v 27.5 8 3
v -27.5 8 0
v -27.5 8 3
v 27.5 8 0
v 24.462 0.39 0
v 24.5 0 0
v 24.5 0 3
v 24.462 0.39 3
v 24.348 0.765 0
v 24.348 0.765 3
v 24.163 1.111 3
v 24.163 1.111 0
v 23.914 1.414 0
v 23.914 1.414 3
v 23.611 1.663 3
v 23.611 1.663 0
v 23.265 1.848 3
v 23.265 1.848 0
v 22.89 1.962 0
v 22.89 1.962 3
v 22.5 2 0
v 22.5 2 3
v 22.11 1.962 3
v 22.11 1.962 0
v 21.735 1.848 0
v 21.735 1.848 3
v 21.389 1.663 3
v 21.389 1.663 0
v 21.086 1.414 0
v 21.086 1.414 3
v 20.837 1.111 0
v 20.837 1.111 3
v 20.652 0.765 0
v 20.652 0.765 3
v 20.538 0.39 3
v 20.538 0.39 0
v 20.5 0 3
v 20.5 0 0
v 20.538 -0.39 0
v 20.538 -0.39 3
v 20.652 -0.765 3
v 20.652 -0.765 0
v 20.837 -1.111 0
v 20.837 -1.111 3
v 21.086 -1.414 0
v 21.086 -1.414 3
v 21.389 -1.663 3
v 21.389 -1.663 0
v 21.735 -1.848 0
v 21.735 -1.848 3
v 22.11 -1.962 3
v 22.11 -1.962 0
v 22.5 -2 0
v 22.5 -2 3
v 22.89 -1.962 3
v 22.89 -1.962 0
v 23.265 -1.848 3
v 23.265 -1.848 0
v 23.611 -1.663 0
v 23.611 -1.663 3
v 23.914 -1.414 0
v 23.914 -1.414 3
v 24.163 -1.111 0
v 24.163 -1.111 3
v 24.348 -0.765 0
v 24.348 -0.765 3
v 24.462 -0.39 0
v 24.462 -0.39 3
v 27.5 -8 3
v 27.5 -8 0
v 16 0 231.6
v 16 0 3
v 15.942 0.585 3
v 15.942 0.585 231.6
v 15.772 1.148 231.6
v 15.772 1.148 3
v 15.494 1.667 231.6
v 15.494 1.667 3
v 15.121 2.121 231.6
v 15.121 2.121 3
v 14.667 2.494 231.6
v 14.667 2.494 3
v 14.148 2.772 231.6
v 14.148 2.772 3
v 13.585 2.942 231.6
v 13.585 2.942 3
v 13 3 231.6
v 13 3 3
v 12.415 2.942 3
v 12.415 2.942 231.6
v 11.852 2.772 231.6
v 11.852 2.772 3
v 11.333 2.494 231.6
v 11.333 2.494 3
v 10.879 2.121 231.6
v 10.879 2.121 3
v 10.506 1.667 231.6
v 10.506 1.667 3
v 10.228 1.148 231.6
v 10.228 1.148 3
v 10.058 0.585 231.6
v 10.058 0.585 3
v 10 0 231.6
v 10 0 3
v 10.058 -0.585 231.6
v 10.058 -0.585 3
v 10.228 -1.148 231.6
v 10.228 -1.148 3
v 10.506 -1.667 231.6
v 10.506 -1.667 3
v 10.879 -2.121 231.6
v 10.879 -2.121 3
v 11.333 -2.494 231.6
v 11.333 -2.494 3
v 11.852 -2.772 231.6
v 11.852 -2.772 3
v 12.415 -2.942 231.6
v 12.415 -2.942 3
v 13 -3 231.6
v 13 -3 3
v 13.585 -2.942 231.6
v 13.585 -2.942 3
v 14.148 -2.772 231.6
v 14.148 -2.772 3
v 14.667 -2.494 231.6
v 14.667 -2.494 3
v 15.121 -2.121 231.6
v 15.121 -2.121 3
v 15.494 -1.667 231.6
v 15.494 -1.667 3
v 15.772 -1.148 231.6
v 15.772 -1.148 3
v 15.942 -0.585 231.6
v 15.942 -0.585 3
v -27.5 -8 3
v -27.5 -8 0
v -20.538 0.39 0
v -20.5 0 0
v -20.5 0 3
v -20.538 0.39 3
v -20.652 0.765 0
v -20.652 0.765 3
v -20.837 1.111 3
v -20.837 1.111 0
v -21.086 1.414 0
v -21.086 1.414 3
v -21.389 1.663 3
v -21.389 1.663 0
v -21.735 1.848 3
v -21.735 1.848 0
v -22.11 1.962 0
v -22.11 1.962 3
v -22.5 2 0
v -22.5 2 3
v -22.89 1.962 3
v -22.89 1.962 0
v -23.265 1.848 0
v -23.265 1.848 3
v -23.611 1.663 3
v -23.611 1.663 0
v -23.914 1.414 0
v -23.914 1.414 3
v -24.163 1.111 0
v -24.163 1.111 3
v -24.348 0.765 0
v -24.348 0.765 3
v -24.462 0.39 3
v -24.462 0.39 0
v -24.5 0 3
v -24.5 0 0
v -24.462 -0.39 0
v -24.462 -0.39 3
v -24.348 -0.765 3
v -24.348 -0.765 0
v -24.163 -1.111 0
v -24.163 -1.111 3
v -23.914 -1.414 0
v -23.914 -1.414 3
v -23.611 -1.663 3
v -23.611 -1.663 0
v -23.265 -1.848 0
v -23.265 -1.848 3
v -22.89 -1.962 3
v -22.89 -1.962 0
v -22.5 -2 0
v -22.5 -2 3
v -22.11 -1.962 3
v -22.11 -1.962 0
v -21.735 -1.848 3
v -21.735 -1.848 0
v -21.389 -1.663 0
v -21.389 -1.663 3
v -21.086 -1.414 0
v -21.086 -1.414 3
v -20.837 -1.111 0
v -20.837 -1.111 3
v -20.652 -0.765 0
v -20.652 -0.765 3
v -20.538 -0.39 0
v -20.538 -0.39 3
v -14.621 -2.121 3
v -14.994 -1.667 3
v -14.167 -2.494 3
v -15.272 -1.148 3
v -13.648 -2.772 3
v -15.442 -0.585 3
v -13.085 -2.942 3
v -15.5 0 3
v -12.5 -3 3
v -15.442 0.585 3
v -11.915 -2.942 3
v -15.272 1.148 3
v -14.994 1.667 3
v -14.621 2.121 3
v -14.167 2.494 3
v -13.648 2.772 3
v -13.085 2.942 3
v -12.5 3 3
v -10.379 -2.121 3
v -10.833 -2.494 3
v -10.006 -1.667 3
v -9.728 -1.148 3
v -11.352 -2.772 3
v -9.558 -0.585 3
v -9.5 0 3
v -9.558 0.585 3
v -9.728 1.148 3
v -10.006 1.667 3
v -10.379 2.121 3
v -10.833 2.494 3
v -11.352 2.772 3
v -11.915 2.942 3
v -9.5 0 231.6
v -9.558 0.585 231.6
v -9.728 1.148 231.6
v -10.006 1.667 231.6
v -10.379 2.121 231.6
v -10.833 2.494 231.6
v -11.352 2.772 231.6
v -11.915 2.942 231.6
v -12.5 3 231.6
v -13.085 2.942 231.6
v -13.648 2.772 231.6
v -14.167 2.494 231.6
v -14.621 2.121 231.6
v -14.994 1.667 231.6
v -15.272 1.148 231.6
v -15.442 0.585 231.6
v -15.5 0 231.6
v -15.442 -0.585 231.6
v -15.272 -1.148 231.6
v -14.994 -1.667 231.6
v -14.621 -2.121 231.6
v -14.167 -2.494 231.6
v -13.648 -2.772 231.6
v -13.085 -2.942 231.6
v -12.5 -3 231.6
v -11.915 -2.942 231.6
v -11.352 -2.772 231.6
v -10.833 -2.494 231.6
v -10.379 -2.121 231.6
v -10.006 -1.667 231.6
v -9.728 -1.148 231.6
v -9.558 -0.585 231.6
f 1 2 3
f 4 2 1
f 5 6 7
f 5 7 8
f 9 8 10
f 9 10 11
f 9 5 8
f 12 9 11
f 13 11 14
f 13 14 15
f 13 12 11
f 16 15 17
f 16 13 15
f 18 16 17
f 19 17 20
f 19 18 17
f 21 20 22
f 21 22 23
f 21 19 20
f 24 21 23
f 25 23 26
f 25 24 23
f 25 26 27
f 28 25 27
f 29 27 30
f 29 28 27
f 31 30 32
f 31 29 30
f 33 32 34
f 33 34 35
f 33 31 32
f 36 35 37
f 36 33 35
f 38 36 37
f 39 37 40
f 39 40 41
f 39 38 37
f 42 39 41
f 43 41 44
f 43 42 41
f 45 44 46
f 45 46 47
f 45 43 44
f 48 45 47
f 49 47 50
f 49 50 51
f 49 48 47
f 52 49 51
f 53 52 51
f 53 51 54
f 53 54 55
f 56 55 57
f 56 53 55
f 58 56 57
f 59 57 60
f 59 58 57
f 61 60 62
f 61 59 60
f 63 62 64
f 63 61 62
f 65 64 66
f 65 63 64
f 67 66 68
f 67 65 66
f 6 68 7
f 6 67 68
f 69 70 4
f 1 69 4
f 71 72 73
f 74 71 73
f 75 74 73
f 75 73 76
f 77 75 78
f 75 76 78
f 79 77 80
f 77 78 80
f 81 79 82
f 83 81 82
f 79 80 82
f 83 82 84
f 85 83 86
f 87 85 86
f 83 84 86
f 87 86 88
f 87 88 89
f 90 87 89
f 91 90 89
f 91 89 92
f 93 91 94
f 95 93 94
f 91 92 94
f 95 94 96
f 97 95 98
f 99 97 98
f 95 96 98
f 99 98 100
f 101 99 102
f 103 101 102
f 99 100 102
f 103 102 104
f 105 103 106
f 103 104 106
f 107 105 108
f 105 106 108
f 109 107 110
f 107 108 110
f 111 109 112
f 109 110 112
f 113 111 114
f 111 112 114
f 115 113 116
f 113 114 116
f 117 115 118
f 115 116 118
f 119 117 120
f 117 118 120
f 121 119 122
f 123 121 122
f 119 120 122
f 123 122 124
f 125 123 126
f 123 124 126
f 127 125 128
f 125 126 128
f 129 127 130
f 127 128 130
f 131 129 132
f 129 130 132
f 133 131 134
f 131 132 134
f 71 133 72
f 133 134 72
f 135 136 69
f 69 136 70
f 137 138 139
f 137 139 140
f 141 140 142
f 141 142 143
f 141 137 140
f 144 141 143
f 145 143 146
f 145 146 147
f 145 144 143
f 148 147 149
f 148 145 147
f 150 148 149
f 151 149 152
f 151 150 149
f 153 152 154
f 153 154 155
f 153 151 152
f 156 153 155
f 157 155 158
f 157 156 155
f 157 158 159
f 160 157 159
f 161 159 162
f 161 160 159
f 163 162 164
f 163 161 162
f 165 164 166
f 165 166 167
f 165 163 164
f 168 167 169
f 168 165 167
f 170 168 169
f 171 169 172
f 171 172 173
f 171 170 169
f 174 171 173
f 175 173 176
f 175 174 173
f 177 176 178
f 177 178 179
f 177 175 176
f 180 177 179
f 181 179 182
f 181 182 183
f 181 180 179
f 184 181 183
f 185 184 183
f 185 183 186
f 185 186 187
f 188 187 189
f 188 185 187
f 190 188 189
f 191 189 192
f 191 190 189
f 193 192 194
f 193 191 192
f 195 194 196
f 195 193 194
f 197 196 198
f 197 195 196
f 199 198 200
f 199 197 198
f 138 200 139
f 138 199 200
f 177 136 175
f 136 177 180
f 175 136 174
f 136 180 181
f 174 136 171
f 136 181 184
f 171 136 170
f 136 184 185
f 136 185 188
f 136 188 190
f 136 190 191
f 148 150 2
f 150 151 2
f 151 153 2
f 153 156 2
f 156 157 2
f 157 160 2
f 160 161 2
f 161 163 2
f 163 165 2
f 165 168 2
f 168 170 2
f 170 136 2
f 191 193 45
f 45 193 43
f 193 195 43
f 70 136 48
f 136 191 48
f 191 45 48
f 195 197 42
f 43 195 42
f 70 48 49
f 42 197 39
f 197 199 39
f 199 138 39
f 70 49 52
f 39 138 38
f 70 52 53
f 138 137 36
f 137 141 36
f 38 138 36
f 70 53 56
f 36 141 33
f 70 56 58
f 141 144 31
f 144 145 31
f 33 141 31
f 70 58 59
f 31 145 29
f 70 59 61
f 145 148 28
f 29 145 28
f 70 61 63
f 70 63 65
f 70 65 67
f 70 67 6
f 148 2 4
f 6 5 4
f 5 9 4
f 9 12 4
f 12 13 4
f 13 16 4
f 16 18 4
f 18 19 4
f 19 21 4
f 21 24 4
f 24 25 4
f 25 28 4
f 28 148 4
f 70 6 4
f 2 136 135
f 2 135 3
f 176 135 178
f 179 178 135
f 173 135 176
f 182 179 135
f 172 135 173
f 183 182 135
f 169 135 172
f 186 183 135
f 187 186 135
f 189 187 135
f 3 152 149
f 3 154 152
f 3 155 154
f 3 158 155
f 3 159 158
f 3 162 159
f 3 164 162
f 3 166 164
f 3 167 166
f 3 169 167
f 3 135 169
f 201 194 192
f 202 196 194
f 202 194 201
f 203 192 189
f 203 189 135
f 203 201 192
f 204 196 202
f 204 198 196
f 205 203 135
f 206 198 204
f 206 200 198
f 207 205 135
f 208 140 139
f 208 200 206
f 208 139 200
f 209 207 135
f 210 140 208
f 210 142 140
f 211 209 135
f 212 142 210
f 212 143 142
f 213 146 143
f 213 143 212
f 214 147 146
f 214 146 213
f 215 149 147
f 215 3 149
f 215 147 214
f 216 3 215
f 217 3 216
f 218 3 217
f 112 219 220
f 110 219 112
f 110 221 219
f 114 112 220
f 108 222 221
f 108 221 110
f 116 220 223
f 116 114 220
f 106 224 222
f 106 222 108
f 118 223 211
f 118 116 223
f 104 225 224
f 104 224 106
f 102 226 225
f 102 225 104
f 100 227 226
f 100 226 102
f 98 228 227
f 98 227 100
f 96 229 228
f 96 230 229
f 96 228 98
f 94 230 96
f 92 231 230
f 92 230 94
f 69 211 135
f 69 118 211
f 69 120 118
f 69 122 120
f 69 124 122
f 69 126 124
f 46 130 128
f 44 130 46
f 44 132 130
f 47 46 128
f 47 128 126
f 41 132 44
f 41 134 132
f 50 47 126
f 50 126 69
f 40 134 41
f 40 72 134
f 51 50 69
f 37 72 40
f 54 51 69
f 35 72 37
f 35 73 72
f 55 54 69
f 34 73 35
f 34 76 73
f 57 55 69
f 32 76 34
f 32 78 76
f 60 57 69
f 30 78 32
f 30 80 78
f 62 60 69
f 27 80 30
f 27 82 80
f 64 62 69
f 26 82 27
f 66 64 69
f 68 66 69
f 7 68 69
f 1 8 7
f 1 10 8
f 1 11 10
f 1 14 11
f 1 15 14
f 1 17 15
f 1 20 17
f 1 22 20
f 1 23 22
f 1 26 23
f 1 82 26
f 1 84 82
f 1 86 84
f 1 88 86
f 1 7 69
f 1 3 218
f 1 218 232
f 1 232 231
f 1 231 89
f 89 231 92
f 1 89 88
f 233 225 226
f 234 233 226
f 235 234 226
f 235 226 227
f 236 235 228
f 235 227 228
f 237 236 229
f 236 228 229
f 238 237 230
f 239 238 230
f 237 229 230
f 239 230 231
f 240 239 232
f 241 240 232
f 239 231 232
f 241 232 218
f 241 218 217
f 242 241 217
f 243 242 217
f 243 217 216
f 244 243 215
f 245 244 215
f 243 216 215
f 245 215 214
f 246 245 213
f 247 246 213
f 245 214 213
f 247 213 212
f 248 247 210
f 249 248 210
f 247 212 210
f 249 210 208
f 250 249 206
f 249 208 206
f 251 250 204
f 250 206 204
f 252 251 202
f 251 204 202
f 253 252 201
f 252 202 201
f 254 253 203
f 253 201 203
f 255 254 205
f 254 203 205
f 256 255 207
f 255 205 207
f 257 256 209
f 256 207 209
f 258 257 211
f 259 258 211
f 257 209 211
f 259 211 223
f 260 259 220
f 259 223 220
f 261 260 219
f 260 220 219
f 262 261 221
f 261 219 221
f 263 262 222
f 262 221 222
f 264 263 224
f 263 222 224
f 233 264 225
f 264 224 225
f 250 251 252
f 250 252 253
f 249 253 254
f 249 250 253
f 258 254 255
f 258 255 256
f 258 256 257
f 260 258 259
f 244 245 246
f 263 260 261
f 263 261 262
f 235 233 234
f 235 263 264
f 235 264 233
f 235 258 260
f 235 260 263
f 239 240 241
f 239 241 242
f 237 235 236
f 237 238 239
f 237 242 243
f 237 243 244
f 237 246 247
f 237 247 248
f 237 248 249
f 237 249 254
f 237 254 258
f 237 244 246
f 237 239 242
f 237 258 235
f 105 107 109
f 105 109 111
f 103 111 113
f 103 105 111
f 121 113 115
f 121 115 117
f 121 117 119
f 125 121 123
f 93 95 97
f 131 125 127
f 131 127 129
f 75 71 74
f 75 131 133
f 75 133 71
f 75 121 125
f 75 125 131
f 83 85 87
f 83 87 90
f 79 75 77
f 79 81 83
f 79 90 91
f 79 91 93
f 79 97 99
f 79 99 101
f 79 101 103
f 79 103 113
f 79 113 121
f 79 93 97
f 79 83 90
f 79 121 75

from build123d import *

# Parameters (mm, degrees)
SKETCH1_W           = 55
SKETCH1_H           = 16
SKETCH1_R           = 2
BOSS_EXTRUDE1_DEPTH = 3
SKETCH3_R           = 3
BOSS_EXTRUDE2_DEPTH = 228.6


with BuildPart() as part:
    # Sketch1 → Boss-Extrude1 (new body)
    with BuildSketch(Plane.XY):
        Rectangle(SKETCH1_W, SKETCH1_H)
        with Locations((-22.5, 0)):
            Circle(SKETCH1_R, mode=Mode.SUBTRACT)
        with Locations((22.5, 0)):
            Circle(SKETCH1_R, mode=Mode.SUBTRACT)
    extrude(amount=BOSS_EXTRUDE1_DEPTH)

    # Sketch3 → Boss-Extrude2 (add)
    with BuildSketch(Plane.XY.offset(3)):
        with Locations((-12.5, 0)):
            Circle(SKETCH3_R)
        with Locations((13, 0)):
            Circle(SKETCH3_R)
    extrude(amount=BOSS_EXTRUDE2_DEPTH)


solid = part.part
